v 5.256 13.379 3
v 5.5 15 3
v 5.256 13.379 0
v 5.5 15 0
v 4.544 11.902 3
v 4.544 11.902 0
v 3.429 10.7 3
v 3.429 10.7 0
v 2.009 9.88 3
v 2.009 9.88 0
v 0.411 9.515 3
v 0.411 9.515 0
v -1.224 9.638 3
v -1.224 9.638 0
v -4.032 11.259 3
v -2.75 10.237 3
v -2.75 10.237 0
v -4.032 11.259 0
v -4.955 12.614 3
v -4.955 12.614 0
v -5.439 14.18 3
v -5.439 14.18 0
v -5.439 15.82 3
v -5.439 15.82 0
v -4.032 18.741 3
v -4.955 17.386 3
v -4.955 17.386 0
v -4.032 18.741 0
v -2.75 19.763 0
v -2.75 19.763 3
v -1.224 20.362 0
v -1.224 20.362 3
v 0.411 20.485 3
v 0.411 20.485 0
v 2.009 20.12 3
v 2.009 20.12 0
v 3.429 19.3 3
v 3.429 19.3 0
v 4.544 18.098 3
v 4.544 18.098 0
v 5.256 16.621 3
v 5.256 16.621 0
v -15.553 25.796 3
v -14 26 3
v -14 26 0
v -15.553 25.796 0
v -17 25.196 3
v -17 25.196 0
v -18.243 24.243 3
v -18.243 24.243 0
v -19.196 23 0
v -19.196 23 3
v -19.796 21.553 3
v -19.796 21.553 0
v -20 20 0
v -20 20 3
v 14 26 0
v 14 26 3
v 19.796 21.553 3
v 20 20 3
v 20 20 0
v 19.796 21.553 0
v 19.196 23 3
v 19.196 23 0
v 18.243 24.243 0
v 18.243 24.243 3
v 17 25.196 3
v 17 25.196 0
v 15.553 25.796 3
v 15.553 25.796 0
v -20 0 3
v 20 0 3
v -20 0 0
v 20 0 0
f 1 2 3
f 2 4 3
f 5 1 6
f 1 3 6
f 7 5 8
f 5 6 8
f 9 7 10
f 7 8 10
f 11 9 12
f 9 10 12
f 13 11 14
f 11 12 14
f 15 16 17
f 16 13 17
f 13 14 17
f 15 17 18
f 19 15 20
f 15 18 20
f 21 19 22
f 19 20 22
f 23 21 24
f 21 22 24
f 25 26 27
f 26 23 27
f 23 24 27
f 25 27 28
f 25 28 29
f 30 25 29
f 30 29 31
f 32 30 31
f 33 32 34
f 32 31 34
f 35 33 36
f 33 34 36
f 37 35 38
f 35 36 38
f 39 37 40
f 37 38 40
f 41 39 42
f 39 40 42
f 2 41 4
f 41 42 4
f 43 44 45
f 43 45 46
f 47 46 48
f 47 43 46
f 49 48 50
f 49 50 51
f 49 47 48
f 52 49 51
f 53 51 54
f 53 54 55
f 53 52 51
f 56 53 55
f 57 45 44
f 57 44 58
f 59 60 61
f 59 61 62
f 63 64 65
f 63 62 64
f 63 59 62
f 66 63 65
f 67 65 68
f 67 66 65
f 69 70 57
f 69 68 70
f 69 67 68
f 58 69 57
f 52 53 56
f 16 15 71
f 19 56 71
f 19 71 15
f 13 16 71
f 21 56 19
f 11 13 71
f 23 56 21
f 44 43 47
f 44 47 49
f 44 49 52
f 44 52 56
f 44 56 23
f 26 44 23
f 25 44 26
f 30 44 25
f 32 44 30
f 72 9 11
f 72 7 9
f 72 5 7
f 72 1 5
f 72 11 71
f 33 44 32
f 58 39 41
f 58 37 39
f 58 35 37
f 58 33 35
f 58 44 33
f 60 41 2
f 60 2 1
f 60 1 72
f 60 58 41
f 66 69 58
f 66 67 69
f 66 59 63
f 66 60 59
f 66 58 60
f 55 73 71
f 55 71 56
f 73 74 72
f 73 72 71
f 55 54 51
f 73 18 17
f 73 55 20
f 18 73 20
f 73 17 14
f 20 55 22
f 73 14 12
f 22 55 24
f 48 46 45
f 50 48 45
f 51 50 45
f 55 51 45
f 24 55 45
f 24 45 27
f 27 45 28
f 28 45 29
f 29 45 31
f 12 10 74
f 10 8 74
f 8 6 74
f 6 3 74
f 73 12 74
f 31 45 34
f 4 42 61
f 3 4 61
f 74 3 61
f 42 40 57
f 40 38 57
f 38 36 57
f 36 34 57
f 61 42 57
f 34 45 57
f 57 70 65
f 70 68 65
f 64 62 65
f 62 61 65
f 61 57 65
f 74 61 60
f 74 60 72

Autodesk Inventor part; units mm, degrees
ref_plane "YZ Plane" through (0, 0, 0) normal (1, 0, 0) x (0, 1, 0)
ref_plane "XZ Plane" through (0, 0, 0) normal (0, 1, 0) x (-1, 0, 0)
ref_plane "XY Plane" through (0, 0, 0) normal (0, 0, 1) x (1, 0, 0)
sketch "Sketch12" plane through (0, 0, 0) normal (0, 0, 1) x (1, 0, 0)
  line L0 (-20, 26) -> (20, 26)
  line L1 (20, 26) -> (20, 0)
  line L2 (20, 0) -> (-20, 0)
  line L3 (-20, 0) -> (-20, 26)
  circle A0 centre (0, 15) radius 5.5
  point P0 (0, 0)
  point P1 (0, 0)
  dimension "d73" = 40
  dimension "d74" = 11
  dimension "d77" = 15
  dimension "d78" = 26
extrude "Plate3" add sketch "Sketch12" along normal blind 3
fillet "Corner Round1" radius 6 2 edges at (-20, 26, 1.5) (20, 26, 1.5)
equation "\"d75\" = Thickness"
equation "\"BendRadius\" = Thickness"
equation "\"BendReliefWidth\" = Thickness"
equation "\"BendReliefDepth\" = 0.5 * Thickness"
equation "\"CornerReliefSize\" = 4 * Thickness"
equation "\"MinimumRemnant\" = 2 * Thickness"
equation "\"TransitionRadius\" = BendRadius"
equation "\"JacobiRadiusSize\" = BendRadius"
equation "\"GapSize\" = Thickness"
equation "\"Thickness\" = 3"
properties part number "ДМФ 094 Постель НОС крепление v2.0"
